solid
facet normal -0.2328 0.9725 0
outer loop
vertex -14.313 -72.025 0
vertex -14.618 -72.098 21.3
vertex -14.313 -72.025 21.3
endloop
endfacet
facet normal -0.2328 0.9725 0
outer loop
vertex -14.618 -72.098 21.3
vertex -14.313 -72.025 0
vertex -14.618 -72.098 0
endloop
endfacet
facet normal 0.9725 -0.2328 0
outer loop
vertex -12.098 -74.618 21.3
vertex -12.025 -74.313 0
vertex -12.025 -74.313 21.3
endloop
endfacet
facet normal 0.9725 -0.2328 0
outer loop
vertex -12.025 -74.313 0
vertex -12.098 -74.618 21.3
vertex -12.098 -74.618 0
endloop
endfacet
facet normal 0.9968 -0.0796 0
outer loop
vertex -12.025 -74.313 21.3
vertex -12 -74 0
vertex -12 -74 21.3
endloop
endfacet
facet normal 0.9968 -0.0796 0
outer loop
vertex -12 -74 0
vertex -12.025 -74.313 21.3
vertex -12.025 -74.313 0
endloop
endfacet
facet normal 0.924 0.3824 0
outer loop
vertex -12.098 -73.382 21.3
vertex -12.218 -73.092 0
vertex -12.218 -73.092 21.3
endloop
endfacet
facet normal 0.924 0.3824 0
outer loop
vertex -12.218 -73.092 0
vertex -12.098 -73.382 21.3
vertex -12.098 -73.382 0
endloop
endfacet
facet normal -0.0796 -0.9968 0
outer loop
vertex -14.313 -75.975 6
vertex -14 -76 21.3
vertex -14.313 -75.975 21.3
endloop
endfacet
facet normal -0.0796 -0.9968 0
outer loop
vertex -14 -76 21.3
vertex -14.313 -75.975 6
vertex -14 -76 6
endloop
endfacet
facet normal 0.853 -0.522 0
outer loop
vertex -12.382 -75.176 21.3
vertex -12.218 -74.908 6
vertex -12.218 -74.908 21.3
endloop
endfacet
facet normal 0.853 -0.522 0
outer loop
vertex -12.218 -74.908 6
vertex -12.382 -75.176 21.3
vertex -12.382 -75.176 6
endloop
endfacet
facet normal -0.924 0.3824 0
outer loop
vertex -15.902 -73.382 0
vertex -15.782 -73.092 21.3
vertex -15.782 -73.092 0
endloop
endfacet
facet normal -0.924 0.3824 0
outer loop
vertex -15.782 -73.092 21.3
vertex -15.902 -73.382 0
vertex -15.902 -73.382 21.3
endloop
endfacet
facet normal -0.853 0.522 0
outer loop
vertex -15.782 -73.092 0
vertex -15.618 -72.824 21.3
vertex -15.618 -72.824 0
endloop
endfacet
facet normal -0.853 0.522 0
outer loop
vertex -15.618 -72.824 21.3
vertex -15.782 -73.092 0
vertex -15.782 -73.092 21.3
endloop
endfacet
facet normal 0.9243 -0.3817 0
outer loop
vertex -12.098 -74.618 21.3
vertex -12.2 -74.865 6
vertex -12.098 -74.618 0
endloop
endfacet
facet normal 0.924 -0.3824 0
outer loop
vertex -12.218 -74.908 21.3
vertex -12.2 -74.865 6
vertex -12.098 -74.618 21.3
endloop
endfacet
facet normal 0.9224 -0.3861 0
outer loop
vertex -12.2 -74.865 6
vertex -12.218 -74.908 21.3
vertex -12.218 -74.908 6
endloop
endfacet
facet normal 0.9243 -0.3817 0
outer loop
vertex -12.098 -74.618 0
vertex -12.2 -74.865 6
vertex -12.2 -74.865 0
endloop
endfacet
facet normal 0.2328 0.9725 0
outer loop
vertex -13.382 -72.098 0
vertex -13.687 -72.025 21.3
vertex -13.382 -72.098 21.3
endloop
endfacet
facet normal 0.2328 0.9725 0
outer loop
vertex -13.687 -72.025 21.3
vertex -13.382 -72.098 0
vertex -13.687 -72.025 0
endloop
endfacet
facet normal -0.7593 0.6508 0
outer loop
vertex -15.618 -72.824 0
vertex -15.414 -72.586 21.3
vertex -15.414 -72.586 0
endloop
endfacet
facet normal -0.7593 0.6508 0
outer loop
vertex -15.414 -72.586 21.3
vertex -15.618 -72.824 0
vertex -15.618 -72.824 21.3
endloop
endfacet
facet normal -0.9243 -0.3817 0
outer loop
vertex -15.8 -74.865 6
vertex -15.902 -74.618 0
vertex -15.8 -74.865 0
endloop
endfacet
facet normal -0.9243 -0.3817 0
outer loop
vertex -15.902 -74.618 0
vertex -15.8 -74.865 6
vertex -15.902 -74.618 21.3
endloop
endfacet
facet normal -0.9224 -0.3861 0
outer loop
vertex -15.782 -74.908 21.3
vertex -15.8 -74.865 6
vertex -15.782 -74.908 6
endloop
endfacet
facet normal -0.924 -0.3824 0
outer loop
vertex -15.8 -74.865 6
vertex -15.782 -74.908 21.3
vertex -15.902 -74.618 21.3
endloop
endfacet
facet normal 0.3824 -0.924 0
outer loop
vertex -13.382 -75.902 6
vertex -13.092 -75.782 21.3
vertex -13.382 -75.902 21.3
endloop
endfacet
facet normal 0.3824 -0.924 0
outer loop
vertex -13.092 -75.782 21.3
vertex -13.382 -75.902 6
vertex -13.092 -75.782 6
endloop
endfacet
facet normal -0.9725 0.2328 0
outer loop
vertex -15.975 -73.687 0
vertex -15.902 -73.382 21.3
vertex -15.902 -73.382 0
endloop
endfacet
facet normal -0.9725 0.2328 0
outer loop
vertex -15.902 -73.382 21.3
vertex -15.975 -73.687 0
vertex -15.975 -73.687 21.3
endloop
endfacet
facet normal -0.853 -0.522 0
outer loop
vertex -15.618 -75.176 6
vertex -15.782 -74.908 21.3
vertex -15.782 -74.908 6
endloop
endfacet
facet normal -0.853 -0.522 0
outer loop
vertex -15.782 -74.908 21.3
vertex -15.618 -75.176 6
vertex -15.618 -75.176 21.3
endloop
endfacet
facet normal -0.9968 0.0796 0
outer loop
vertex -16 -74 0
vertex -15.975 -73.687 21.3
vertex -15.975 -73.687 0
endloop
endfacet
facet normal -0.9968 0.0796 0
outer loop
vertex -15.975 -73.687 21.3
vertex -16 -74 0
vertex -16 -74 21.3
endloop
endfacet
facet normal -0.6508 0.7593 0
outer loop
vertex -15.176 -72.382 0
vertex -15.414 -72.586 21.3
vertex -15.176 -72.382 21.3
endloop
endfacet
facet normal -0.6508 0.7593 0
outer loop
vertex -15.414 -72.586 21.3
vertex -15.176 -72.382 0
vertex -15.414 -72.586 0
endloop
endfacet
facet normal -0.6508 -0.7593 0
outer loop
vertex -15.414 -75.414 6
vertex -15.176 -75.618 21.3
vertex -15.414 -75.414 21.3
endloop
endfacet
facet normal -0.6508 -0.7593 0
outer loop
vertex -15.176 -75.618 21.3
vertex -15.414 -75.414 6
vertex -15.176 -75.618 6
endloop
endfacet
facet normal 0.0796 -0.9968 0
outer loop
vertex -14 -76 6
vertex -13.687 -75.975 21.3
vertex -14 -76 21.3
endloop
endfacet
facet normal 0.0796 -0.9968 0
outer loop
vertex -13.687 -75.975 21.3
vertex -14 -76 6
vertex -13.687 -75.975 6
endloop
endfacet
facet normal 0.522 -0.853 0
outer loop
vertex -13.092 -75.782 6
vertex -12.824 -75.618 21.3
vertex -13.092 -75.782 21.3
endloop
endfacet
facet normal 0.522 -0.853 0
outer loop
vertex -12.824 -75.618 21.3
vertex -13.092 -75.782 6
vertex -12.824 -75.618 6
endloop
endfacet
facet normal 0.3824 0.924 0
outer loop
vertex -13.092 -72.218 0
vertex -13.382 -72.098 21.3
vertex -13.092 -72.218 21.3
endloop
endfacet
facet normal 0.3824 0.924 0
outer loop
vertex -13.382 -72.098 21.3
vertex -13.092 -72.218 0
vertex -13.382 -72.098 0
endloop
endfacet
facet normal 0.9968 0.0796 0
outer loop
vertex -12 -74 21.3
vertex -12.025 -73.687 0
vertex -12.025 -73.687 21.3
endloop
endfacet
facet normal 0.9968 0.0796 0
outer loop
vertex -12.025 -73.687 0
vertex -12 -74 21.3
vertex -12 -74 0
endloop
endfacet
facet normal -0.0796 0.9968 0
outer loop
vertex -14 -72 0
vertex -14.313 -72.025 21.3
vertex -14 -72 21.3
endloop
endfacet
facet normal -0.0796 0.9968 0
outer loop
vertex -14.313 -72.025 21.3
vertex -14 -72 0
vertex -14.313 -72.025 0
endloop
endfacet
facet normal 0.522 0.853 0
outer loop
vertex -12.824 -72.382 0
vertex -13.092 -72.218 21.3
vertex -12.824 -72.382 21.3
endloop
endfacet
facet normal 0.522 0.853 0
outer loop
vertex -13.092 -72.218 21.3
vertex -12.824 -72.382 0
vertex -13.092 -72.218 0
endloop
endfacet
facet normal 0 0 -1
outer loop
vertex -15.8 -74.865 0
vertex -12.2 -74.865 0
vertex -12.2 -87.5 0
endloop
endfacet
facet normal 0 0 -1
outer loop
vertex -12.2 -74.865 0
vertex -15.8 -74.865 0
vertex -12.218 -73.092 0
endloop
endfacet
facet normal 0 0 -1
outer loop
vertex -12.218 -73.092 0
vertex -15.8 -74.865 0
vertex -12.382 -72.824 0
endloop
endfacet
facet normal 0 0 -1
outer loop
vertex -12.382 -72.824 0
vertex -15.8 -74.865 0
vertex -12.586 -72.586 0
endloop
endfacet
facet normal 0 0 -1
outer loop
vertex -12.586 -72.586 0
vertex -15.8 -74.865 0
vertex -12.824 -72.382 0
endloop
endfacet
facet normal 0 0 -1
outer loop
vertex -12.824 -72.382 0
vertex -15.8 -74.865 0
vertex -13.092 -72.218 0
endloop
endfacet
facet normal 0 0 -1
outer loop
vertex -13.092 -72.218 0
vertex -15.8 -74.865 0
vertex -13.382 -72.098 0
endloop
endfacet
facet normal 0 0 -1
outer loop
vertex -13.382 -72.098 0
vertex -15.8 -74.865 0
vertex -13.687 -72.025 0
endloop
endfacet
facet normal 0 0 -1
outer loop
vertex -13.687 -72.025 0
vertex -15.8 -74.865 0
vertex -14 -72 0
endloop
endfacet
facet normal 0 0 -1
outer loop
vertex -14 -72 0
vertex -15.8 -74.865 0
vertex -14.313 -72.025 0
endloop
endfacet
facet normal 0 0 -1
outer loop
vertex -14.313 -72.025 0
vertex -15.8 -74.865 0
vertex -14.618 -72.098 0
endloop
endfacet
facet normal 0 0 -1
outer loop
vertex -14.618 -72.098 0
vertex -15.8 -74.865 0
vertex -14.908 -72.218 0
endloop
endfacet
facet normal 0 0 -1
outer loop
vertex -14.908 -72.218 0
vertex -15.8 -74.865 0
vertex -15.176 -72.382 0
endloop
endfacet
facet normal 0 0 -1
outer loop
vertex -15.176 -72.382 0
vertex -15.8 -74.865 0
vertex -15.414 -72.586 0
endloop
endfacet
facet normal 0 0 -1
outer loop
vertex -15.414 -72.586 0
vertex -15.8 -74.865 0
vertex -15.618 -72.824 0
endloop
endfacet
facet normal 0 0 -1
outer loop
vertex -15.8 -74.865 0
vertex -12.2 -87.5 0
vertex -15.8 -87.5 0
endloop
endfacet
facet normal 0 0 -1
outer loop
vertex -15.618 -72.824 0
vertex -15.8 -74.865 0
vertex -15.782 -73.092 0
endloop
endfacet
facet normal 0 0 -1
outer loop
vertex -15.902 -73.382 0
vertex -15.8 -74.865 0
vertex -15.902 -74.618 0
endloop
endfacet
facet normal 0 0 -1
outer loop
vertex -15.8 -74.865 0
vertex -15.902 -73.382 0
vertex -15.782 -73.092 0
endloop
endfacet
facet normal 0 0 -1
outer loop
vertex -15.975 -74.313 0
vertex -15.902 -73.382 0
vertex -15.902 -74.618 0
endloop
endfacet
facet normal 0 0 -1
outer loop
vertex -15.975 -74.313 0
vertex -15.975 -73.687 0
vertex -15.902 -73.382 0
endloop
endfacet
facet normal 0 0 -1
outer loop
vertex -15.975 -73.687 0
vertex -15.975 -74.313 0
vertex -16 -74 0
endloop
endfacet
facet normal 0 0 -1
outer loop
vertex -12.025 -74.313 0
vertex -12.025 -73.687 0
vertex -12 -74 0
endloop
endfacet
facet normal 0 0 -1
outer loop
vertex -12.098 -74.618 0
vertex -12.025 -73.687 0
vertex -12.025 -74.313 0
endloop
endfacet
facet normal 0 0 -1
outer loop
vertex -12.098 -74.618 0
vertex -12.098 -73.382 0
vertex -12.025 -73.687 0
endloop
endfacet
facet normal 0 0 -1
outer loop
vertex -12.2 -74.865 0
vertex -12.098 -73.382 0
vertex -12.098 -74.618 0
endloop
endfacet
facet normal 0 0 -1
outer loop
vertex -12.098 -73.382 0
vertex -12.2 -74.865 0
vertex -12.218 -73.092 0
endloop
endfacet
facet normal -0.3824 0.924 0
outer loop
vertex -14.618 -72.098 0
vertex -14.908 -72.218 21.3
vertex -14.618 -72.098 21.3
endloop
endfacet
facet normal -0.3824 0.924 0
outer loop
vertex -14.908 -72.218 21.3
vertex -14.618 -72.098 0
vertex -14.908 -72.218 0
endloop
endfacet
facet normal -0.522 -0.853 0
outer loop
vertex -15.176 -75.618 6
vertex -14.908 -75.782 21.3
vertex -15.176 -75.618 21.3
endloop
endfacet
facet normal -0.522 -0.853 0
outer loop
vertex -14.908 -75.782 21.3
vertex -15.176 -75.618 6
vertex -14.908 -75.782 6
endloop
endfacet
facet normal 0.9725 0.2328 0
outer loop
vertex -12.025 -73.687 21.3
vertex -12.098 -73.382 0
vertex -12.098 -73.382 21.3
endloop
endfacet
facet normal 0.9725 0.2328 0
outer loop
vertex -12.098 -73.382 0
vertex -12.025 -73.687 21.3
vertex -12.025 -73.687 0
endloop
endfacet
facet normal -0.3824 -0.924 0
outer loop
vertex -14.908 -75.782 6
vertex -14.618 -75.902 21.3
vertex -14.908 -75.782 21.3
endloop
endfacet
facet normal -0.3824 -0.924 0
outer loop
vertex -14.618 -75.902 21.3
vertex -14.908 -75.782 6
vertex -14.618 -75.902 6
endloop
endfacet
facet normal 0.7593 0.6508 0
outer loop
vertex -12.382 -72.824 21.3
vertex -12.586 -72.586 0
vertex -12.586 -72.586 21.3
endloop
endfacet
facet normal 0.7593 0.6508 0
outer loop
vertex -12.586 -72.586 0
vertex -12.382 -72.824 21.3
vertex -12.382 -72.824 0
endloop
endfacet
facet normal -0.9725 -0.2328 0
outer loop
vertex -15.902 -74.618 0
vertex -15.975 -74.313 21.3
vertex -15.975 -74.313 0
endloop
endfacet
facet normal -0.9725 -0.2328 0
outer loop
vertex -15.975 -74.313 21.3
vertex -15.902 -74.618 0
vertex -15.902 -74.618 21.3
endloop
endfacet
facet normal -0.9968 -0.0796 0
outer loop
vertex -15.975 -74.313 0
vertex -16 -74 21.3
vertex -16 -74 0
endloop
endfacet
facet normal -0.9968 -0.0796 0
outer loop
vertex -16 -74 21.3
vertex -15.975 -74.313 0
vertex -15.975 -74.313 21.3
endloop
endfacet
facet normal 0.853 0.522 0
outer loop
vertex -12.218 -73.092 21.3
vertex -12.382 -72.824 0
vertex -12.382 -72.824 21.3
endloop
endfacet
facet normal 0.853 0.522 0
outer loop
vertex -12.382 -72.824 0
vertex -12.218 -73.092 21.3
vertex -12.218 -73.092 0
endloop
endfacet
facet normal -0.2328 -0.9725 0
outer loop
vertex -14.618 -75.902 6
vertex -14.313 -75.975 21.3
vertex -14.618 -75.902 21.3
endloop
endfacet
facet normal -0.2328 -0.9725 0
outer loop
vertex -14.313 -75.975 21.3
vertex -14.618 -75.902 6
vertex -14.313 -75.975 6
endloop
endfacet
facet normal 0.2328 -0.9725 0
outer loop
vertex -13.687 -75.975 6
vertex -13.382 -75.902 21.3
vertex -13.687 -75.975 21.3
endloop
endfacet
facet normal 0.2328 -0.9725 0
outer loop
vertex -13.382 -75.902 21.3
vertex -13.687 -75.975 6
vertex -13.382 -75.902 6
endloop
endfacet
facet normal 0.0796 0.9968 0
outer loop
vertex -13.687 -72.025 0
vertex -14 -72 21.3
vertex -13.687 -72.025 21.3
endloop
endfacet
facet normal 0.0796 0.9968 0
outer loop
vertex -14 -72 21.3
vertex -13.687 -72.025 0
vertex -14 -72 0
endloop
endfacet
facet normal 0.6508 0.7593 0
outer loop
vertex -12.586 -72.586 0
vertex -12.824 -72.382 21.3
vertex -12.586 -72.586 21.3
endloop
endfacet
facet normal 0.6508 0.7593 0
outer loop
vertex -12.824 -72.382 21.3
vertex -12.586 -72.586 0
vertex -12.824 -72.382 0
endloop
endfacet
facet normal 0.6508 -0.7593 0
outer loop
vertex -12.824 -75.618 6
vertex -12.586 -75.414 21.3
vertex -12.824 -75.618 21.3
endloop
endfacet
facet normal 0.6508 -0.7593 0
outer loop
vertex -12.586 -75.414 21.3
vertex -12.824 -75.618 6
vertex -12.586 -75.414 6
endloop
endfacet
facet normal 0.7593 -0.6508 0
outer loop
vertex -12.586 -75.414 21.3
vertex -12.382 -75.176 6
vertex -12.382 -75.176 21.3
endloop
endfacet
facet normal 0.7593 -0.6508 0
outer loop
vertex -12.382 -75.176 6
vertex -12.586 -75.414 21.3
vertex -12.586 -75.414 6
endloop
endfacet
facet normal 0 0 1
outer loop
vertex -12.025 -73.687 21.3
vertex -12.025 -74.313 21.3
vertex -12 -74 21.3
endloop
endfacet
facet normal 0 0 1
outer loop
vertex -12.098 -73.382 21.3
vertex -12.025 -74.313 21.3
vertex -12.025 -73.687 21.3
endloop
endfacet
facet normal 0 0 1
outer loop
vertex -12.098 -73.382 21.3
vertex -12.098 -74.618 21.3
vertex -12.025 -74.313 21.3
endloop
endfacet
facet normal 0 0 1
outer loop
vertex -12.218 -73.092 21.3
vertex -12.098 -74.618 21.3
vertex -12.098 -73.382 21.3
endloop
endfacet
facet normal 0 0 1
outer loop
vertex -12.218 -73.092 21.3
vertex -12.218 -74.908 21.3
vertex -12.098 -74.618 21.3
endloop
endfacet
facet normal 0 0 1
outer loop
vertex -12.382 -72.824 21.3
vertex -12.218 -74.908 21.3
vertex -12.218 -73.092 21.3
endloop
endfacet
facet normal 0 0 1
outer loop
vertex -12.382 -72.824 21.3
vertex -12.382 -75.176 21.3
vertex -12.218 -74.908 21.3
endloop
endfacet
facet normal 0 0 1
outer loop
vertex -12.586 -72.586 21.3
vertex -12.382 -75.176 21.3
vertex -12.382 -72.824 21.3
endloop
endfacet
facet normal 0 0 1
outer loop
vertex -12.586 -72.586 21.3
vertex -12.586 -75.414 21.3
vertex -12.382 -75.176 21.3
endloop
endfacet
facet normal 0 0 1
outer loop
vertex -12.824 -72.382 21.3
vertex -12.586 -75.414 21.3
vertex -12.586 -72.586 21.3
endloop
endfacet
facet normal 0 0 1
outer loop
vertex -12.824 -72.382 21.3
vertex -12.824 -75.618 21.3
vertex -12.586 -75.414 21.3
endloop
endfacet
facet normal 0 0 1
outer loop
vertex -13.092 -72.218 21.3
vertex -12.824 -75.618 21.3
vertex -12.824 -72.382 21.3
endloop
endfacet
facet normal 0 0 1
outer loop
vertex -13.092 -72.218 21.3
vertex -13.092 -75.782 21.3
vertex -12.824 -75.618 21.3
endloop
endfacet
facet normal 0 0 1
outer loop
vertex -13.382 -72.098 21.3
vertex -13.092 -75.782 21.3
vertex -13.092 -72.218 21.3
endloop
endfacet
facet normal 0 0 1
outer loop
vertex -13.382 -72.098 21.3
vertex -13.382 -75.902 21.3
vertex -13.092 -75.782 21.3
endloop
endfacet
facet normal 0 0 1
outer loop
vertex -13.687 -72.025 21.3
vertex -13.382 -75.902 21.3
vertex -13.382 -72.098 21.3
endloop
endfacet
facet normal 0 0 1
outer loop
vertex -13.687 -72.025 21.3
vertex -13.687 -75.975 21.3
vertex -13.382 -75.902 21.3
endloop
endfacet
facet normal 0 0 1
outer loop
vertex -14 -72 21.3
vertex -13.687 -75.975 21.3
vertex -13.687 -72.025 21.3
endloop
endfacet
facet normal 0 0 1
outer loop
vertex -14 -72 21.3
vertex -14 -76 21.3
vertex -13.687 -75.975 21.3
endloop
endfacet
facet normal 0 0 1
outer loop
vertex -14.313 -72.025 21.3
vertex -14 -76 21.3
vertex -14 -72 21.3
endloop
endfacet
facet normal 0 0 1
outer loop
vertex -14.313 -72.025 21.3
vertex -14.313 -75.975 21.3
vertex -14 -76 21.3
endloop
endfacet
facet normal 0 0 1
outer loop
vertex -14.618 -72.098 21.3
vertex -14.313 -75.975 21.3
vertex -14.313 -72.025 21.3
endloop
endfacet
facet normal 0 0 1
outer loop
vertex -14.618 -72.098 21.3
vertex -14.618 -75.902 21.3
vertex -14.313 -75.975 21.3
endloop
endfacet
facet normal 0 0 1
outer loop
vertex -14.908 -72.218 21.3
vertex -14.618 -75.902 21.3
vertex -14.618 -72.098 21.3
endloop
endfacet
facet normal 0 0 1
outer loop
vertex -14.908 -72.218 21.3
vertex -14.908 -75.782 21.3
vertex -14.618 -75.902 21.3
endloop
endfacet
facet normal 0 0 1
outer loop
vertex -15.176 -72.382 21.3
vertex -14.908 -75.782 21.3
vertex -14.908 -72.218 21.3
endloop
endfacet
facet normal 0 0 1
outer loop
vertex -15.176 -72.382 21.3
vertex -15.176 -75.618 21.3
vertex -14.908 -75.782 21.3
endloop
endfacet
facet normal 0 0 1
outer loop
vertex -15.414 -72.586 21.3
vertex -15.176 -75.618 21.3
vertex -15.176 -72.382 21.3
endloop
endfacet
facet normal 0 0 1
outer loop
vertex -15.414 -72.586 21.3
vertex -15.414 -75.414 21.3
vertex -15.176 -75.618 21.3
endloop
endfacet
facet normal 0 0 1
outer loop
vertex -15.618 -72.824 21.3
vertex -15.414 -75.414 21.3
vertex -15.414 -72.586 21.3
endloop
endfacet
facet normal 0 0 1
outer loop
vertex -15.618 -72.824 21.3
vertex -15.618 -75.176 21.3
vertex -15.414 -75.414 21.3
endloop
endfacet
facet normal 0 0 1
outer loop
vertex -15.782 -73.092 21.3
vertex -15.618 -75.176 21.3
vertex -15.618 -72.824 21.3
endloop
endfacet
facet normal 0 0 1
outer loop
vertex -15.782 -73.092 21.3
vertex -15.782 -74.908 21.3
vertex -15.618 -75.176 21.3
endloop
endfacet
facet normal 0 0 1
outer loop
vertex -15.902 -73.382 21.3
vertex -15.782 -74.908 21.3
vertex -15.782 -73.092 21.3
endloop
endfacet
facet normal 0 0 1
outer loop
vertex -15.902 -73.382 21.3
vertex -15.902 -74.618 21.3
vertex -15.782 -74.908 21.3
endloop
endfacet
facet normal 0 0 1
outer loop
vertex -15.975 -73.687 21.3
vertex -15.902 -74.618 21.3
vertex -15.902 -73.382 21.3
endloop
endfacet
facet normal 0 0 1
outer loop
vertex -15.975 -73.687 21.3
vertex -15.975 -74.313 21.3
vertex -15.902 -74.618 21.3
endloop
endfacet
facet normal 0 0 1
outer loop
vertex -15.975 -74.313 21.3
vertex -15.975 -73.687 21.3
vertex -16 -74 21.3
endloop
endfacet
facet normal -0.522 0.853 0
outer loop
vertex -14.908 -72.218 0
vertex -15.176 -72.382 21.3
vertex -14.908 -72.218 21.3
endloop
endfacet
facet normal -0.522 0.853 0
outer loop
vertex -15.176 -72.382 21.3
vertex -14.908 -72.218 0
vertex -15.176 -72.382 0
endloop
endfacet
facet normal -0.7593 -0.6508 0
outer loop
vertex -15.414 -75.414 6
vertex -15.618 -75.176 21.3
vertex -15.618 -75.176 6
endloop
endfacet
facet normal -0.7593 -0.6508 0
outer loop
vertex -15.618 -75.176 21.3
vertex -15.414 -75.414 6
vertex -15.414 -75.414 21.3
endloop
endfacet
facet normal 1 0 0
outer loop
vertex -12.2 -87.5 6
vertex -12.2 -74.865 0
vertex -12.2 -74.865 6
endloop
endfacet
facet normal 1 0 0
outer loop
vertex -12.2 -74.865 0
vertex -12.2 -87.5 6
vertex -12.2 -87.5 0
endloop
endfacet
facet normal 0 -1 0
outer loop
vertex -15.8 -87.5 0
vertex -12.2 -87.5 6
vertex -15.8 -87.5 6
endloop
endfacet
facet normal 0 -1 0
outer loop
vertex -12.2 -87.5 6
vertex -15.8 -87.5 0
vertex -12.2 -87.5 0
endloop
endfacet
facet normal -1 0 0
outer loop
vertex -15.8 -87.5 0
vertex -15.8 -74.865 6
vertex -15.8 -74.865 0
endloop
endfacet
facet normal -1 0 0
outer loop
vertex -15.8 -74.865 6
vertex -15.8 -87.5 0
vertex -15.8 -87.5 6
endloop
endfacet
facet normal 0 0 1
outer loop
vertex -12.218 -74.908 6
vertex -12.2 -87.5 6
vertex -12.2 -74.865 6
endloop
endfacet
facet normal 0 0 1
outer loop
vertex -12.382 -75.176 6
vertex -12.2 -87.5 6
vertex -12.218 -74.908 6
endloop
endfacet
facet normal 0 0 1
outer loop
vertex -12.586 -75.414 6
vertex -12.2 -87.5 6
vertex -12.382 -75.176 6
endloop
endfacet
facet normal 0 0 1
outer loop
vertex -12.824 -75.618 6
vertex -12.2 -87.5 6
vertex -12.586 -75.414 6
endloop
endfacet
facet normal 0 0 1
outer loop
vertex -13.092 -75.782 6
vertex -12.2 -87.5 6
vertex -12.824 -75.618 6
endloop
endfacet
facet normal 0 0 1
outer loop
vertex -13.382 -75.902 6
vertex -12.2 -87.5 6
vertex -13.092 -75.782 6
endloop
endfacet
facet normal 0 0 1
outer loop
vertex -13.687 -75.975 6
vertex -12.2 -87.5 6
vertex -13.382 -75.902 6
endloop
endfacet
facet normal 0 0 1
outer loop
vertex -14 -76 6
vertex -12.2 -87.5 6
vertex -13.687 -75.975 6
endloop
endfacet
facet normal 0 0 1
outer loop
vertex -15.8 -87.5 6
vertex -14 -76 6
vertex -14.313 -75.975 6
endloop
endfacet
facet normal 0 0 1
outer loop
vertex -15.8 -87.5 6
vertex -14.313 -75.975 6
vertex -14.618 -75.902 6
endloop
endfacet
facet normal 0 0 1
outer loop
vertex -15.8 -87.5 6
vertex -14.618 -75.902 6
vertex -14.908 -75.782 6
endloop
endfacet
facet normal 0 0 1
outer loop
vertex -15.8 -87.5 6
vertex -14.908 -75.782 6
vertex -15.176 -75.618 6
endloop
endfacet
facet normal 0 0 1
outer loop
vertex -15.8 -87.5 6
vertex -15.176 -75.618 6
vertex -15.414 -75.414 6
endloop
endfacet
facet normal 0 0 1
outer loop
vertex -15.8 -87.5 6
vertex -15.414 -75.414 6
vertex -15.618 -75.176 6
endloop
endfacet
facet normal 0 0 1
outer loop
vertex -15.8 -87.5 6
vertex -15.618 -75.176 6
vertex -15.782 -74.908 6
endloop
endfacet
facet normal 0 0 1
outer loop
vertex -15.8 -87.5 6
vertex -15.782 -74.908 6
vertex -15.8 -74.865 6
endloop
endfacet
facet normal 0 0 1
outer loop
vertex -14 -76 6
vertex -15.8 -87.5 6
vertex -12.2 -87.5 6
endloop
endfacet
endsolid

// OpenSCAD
include <../lib/hc33-lipo-case-lib.scad>;
$fn = 40;
bolt_print();
